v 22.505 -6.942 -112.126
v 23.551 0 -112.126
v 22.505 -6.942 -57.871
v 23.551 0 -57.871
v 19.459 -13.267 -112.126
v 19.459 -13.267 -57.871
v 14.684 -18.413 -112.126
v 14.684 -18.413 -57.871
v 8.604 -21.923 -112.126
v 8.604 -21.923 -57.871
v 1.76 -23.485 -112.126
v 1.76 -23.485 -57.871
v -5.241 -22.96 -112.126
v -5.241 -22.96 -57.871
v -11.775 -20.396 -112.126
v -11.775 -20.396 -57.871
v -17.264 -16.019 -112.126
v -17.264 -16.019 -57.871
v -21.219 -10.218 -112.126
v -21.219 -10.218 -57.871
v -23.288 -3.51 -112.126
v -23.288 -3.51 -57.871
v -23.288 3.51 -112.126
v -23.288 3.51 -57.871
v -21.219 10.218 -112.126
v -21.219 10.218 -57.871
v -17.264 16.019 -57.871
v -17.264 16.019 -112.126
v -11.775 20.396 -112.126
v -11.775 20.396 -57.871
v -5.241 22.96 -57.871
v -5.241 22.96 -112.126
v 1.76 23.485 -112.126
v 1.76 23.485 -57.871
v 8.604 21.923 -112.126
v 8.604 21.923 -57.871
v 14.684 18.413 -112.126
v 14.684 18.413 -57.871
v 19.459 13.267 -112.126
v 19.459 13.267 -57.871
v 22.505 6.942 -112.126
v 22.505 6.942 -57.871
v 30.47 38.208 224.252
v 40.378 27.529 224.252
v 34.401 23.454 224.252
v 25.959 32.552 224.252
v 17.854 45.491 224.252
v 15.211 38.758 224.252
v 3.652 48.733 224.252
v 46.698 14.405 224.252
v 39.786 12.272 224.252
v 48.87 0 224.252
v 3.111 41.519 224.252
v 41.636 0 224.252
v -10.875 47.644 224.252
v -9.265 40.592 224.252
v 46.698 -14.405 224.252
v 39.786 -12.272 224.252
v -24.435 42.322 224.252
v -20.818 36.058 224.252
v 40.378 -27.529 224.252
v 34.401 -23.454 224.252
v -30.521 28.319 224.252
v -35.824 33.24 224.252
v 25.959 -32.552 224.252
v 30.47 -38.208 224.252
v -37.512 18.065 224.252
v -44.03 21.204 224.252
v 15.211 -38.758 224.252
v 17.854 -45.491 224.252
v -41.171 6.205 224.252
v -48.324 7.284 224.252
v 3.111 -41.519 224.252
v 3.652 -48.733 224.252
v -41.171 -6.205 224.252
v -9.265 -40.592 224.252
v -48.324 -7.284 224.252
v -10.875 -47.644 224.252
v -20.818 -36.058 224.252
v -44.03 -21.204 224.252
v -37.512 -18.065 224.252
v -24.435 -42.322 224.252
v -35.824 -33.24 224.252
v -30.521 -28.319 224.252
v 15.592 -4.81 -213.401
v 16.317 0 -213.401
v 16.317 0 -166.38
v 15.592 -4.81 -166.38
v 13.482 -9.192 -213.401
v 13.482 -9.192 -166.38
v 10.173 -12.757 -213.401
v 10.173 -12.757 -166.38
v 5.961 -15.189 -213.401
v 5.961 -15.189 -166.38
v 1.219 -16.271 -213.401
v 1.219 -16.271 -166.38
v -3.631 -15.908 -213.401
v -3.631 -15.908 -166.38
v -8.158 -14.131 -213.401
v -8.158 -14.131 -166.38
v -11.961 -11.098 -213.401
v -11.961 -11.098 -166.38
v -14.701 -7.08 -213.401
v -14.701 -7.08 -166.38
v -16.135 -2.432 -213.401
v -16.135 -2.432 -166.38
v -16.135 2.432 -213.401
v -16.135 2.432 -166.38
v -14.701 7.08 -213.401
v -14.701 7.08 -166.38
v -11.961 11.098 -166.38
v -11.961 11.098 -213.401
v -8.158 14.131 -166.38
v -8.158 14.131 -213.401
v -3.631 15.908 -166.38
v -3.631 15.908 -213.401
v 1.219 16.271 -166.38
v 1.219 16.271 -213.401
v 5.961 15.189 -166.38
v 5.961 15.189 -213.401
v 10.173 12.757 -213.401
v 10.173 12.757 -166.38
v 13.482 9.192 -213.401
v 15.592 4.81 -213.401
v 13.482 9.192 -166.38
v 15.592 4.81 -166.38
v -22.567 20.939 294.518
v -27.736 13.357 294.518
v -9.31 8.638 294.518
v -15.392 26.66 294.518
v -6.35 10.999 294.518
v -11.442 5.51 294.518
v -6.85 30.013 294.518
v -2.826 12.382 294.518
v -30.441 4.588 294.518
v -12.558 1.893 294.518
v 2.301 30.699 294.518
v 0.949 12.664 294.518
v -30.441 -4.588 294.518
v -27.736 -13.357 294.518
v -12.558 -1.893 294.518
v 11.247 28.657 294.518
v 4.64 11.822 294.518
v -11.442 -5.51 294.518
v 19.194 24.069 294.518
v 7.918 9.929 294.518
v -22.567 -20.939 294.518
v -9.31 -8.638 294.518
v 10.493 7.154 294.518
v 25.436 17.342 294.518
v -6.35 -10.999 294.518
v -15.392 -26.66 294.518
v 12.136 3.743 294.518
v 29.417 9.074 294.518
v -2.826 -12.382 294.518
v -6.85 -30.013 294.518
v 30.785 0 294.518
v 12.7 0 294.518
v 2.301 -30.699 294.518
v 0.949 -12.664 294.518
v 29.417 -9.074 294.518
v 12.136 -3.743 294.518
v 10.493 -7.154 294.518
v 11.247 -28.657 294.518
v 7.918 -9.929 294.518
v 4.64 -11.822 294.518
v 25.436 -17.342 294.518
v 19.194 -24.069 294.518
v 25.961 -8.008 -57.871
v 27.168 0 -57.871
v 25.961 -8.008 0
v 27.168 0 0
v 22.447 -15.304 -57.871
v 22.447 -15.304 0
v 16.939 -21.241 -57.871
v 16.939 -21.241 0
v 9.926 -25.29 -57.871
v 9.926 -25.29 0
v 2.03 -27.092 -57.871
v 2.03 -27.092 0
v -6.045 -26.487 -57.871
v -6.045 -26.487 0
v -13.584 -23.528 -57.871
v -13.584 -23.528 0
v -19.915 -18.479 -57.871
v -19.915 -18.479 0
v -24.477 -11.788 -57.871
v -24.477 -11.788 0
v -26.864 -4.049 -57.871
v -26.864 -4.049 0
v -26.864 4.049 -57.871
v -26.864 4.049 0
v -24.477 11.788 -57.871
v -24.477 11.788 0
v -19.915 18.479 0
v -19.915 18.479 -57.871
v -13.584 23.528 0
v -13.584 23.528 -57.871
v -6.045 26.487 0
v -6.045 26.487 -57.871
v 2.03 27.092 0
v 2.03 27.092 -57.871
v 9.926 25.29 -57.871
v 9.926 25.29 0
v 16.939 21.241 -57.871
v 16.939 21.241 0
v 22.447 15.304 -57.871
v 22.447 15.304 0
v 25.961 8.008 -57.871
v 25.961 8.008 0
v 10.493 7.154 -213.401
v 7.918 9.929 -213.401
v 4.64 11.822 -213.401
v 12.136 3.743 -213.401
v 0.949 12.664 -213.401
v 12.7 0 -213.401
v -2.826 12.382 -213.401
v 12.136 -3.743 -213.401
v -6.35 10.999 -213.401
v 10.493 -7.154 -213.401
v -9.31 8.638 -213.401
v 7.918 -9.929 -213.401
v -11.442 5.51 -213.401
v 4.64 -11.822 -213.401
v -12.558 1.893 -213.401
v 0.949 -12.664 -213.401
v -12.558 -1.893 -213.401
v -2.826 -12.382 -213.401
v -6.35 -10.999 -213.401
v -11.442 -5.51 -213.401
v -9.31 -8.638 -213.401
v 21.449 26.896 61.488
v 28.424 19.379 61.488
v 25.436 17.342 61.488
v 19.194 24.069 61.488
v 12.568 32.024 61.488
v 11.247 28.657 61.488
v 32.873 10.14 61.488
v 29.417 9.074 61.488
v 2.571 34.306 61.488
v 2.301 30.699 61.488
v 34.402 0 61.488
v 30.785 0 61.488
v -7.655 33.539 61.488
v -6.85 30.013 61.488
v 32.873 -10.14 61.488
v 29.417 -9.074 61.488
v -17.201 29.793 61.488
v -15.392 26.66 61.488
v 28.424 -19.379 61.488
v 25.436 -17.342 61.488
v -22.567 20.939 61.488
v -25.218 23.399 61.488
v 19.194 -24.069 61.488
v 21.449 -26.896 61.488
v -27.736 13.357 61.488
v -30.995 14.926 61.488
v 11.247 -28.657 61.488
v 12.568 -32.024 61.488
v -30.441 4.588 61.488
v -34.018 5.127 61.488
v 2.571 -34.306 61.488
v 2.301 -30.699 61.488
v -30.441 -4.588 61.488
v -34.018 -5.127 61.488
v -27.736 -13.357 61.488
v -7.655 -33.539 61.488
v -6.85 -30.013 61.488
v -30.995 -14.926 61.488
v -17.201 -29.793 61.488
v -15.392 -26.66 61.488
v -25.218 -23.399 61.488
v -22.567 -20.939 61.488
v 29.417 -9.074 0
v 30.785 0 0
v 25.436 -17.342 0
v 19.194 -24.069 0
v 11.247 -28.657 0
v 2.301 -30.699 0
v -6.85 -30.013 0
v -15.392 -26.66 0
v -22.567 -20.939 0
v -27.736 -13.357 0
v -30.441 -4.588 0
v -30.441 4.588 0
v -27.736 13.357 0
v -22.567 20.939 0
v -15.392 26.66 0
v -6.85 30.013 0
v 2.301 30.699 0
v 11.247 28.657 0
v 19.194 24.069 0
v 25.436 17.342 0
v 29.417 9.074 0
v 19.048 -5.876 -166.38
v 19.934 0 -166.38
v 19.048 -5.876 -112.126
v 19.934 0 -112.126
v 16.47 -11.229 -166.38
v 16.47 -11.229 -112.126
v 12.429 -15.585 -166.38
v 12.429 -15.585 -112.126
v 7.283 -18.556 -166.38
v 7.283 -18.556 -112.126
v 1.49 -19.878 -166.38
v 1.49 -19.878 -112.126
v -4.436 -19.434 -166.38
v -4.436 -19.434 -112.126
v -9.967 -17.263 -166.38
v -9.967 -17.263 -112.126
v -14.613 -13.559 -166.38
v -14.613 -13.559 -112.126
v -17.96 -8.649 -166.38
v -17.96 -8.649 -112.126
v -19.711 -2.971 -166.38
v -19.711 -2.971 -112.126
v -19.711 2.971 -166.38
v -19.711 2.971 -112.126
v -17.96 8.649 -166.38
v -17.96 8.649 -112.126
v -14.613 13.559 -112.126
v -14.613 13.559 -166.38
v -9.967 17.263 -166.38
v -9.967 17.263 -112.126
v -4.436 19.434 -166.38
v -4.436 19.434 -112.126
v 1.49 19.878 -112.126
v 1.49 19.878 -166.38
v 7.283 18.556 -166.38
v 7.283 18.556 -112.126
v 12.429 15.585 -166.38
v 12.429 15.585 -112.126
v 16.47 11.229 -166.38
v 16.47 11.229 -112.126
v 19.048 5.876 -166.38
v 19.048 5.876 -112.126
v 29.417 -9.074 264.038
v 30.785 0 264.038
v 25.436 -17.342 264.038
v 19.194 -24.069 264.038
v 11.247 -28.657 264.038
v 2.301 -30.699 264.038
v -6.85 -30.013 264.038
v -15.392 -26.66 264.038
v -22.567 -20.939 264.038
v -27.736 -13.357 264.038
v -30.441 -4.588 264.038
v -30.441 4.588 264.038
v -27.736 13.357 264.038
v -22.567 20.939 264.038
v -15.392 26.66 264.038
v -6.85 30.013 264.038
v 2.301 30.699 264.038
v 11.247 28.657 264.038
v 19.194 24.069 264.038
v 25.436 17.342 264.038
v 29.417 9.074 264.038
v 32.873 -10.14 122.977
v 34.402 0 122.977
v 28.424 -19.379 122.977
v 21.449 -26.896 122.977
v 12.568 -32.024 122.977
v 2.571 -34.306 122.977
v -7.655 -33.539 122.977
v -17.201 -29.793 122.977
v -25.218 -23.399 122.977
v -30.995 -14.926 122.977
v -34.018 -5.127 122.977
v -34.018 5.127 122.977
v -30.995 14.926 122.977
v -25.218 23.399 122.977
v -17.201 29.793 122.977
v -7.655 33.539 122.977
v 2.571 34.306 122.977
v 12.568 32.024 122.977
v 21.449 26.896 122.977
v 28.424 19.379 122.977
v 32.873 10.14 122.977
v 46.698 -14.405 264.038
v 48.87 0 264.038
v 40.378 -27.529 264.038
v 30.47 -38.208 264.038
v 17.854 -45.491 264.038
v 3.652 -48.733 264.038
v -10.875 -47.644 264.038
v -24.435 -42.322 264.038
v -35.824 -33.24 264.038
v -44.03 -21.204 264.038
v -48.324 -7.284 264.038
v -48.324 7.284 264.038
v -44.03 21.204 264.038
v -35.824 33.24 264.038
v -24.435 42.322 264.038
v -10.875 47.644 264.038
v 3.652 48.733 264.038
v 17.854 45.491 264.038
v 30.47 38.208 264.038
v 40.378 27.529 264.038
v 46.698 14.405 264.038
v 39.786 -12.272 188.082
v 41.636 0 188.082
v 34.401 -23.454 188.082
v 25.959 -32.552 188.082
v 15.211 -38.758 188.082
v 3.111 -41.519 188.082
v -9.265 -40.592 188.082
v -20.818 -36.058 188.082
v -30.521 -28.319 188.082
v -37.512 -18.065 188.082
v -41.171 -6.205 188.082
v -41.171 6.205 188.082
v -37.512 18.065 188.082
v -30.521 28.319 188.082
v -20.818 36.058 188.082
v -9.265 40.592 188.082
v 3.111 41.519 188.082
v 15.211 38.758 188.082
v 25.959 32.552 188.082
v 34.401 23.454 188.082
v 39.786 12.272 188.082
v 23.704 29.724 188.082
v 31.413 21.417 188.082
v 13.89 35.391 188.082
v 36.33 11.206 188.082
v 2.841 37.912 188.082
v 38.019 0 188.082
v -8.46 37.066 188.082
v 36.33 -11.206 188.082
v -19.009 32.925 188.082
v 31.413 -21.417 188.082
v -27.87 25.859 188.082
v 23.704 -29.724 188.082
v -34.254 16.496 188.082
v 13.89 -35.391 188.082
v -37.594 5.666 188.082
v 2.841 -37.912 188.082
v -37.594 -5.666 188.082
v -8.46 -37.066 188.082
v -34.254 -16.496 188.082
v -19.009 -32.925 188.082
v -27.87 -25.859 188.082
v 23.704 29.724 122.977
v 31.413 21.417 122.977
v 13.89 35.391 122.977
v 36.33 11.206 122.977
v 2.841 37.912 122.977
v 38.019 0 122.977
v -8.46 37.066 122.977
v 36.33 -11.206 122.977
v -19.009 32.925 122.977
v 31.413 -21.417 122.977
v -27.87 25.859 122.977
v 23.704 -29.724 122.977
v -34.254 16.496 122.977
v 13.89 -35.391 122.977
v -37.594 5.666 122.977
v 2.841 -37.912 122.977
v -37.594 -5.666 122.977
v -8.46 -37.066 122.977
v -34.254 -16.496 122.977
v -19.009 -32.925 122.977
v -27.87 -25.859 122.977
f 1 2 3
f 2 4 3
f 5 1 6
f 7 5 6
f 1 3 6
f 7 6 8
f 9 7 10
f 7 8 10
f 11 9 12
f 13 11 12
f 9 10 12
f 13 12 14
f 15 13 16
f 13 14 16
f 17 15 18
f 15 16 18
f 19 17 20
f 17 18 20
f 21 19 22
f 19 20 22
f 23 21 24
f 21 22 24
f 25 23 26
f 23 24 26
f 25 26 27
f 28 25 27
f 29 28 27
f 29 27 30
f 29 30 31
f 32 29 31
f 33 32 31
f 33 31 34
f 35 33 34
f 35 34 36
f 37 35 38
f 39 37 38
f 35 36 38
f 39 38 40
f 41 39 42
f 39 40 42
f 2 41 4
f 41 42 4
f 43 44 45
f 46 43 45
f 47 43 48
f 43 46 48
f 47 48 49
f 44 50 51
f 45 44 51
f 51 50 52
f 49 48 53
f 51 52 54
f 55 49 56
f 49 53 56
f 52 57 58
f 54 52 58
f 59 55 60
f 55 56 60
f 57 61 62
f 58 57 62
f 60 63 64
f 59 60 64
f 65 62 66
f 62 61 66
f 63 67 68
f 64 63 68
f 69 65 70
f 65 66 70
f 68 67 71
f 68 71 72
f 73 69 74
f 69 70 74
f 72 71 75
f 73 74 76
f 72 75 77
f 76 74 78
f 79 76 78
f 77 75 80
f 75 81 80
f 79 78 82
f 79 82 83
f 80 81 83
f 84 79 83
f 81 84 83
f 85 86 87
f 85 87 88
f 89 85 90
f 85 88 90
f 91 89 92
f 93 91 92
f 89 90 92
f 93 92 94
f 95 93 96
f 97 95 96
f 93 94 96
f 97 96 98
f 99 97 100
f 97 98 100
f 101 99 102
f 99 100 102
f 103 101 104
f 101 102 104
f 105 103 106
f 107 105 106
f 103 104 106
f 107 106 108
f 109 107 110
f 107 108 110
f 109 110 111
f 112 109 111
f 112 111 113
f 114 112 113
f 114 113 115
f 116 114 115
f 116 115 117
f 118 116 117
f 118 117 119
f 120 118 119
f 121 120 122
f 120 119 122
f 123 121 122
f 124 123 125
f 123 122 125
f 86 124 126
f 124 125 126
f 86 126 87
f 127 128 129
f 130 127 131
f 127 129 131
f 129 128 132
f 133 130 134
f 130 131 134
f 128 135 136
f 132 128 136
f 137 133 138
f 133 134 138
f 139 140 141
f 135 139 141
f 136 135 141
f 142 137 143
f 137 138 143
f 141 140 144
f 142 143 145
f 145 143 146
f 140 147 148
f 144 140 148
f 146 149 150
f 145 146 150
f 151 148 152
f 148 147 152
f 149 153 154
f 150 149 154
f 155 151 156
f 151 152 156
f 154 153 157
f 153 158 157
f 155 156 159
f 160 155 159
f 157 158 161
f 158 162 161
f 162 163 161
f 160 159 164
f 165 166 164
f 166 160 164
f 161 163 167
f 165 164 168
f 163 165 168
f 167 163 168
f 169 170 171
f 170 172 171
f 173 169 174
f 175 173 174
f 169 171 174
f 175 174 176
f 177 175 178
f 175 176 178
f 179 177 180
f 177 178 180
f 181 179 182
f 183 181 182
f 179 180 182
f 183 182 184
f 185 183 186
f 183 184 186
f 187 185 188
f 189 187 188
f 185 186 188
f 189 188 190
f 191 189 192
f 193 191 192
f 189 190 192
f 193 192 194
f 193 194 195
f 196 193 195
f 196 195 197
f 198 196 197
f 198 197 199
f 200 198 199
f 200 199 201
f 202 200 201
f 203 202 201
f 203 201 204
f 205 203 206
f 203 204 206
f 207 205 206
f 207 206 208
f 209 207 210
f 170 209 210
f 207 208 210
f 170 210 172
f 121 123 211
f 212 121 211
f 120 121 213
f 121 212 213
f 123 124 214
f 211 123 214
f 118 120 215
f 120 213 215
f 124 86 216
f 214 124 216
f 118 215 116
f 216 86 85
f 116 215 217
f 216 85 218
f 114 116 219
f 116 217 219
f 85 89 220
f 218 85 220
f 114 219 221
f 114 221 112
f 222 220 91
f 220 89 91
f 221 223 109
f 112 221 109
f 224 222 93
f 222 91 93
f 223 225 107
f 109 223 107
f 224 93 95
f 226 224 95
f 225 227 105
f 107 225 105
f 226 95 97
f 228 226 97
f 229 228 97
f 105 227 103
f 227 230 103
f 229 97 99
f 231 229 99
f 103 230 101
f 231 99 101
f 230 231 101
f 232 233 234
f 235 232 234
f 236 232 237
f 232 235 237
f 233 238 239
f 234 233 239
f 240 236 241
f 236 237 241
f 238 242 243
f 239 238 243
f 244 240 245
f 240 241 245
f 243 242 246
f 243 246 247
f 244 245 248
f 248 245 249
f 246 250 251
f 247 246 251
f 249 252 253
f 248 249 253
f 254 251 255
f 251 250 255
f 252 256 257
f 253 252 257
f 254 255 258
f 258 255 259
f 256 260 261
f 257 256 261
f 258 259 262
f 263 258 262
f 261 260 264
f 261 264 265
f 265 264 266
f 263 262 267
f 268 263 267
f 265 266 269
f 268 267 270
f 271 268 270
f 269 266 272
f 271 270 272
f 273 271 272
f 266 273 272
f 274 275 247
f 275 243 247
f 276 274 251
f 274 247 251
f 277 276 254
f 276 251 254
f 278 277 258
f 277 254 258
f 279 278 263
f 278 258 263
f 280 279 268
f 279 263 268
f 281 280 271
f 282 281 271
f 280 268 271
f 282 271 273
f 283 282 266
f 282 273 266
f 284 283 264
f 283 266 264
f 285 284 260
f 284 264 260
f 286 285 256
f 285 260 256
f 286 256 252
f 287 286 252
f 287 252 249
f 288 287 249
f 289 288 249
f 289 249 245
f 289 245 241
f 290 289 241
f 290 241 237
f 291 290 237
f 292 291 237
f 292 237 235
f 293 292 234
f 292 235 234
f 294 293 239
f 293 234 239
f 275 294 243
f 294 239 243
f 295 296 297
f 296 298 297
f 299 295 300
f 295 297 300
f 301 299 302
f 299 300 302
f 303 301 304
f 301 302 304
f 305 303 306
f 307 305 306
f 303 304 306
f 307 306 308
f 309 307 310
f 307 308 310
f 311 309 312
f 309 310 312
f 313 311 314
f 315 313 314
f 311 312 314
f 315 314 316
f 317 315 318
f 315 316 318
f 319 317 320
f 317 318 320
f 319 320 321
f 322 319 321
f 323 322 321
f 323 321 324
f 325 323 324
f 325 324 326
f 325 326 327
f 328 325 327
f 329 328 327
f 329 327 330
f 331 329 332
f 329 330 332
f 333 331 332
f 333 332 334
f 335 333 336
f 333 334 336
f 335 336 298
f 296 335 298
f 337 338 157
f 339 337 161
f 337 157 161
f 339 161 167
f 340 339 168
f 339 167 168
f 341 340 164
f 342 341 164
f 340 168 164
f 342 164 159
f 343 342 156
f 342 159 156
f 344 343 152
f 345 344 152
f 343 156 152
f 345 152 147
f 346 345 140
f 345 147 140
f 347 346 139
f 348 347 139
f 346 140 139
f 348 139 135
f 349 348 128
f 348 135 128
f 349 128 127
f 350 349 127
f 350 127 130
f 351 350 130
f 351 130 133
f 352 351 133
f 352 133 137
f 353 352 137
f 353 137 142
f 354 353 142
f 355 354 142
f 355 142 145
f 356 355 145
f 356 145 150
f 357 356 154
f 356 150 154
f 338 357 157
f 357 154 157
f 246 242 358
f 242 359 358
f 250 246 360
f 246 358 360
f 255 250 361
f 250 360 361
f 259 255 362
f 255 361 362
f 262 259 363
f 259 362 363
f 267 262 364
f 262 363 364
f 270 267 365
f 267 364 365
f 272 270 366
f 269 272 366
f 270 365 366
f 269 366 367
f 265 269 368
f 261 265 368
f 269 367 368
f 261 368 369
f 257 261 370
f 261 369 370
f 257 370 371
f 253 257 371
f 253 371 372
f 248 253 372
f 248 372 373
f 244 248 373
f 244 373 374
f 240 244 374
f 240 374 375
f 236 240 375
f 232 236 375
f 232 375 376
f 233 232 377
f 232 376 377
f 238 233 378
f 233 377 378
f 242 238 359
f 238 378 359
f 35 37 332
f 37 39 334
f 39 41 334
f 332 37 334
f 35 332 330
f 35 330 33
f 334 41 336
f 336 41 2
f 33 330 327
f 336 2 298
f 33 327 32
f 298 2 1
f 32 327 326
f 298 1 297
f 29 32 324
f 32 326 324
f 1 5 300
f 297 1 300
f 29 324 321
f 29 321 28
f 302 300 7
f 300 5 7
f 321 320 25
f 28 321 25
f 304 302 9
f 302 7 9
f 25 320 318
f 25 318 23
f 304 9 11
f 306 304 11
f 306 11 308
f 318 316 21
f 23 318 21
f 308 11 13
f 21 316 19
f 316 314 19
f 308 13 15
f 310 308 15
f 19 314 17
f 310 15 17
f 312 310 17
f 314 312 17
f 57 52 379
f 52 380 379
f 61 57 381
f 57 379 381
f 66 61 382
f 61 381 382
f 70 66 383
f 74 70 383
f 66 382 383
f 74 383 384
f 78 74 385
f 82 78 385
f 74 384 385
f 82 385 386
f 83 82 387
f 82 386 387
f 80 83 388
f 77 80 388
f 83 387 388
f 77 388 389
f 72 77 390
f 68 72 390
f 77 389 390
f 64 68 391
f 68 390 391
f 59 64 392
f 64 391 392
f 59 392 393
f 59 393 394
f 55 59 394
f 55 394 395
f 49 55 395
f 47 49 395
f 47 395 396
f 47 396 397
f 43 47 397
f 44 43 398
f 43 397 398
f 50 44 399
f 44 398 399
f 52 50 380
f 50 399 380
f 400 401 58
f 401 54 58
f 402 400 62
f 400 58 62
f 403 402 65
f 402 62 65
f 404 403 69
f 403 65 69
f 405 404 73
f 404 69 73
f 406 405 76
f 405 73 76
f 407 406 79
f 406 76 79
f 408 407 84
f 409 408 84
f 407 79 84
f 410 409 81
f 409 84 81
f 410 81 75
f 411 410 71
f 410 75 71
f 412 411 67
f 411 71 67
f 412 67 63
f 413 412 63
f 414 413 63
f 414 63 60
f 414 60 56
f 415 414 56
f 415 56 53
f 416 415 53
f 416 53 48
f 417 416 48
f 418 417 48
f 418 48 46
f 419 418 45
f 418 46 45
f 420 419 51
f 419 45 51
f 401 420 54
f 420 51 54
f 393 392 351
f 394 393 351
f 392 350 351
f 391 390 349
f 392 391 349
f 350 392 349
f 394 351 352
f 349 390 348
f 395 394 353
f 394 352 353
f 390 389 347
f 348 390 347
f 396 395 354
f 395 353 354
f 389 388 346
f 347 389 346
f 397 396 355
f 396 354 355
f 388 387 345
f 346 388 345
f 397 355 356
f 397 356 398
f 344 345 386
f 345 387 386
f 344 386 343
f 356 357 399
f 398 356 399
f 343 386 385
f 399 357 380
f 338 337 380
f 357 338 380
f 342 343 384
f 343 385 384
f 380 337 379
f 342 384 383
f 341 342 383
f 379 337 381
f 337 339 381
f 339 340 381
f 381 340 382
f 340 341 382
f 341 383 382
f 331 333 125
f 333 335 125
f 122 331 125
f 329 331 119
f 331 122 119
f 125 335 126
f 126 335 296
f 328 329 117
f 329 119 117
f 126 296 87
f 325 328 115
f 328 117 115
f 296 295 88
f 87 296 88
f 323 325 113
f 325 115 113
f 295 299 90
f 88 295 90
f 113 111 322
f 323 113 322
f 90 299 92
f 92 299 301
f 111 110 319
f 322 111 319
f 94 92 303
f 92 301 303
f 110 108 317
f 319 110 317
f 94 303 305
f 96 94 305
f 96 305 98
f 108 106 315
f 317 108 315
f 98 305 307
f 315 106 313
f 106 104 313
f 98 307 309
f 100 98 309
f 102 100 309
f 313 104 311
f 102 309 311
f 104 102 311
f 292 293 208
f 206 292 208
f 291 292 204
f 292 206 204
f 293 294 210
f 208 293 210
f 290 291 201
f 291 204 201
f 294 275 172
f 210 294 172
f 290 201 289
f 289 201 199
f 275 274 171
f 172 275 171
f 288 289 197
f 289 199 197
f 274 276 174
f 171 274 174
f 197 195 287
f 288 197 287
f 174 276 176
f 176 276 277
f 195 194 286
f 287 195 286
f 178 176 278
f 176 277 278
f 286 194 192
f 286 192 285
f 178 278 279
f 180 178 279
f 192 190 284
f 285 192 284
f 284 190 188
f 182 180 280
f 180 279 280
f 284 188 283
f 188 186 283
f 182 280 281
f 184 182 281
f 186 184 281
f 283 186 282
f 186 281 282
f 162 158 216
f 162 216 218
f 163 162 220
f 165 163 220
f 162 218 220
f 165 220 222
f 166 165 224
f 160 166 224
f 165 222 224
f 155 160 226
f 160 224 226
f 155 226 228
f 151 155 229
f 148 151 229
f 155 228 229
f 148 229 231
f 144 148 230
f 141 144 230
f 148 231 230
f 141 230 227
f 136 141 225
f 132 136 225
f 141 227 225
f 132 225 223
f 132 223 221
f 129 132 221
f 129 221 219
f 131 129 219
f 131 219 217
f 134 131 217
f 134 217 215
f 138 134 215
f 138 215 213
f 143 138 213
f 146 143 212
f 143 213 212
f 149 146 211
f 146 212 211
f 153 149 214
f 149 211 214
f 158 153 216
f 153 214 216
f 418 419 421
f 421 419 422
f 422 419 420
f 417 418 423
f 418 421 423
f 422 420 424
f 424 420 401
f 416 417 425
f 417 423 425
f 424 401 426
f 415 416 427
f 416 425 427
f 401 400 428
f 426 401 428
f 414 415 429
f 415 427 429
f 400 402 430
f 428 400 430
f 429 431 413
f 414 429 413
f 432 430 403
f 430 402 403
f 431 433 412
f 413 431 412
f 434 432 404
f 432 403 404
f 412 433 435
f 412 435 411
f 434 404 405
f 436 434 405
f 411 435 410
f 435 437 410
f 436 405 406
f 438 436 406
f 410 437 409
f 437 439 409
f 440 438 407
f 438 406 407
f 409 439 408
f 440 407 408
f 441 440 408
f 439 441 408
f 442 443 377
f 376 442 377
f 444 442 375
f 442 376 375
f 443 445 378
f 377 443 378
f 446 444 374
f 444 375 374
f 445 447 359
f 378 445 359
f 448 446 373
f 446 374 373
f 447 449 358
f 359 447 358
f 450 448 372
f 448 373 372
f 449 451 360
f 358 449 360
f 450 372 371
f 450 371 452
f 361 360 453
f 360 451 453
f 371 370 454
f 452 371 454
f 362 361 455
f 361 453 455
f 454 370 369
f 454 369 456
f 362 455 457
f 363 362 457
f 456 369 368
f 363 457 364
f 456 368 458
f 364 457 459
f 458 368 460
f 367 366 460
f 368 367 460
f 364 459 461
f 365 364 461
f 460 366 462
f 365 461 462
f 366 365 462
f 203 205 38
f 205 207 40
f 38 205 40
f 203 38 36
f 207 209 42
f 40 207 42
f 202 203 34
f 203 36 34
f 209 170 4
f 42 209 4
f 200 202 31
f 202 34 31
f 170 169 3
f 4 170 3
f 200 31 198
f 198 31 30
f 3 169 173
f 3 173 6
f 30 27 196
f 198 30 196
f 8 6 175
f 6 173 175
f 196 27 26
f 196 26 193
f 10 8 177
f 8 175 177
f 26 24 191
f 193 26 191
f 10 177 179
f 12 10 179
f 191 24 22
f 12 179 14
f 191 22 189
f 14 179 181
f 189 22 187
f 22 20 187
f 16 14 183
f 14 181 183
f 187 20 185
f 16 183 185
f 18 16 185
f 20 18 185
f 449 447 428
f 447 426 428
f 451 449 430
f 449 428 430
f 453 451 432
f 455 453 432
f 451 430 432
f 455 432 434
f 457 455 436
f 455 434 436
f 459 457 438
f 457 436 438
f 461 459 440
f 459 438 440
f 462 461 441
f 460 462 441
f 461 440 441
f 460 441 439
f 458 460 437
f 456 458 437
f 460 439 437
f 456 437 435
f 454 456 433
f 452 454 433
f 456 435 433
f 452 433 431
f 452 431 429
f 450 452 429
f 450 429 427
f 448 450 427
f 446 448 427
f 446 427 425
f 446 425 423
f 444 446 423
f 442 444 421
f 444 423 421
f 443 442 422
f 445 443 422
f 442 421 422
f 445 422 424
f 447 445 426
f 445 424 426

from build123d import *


with BuildPart() as part:
    # Sketch1 → Revolve1 (revolve)
    with BuildSketch(Plane(origin=(0, 0, 0), x_dir=(0, 0, -1), z_dir=(1, 0, 0)), mode=Mode.PRIVATE) as revolve1_sk:
        Polygon((-264.03808, 12.7), (213.40064, 12.7), (213.40064, 16.31696), (166.38016, 16.31696), (166.38016, 19.93392), (112.12576, 19.93392), (112.12576, 23.55088), (57.87136, 23.55088), (57.87136, 27.16784), (0, 27.16784), (0, 30.7848), (-61.48832, 30.7848), (-61.48832, 34.40176), (-122.97664, 34.40176), (-122.97664, 38.01872), (-188.08192, 38.01872), (-188.08192, 41.63568), (-224.25152, 41.63568), (-224.25152, 48.8696), (-264.03808, 48.8696), (-264.03808, 38.01872), (-264.03808, 30.7848), (-294.51808, 30.7848), (-294.51808, 12.7), align=None)
    revolve(revolve1_sk.sketch.rotate(Axis((0, 0, 19.904928919), (0, 0, -1)), 90), axis=Axis((0, 0, 19.904928919), (0, 0, -1)))


solid = part.part
